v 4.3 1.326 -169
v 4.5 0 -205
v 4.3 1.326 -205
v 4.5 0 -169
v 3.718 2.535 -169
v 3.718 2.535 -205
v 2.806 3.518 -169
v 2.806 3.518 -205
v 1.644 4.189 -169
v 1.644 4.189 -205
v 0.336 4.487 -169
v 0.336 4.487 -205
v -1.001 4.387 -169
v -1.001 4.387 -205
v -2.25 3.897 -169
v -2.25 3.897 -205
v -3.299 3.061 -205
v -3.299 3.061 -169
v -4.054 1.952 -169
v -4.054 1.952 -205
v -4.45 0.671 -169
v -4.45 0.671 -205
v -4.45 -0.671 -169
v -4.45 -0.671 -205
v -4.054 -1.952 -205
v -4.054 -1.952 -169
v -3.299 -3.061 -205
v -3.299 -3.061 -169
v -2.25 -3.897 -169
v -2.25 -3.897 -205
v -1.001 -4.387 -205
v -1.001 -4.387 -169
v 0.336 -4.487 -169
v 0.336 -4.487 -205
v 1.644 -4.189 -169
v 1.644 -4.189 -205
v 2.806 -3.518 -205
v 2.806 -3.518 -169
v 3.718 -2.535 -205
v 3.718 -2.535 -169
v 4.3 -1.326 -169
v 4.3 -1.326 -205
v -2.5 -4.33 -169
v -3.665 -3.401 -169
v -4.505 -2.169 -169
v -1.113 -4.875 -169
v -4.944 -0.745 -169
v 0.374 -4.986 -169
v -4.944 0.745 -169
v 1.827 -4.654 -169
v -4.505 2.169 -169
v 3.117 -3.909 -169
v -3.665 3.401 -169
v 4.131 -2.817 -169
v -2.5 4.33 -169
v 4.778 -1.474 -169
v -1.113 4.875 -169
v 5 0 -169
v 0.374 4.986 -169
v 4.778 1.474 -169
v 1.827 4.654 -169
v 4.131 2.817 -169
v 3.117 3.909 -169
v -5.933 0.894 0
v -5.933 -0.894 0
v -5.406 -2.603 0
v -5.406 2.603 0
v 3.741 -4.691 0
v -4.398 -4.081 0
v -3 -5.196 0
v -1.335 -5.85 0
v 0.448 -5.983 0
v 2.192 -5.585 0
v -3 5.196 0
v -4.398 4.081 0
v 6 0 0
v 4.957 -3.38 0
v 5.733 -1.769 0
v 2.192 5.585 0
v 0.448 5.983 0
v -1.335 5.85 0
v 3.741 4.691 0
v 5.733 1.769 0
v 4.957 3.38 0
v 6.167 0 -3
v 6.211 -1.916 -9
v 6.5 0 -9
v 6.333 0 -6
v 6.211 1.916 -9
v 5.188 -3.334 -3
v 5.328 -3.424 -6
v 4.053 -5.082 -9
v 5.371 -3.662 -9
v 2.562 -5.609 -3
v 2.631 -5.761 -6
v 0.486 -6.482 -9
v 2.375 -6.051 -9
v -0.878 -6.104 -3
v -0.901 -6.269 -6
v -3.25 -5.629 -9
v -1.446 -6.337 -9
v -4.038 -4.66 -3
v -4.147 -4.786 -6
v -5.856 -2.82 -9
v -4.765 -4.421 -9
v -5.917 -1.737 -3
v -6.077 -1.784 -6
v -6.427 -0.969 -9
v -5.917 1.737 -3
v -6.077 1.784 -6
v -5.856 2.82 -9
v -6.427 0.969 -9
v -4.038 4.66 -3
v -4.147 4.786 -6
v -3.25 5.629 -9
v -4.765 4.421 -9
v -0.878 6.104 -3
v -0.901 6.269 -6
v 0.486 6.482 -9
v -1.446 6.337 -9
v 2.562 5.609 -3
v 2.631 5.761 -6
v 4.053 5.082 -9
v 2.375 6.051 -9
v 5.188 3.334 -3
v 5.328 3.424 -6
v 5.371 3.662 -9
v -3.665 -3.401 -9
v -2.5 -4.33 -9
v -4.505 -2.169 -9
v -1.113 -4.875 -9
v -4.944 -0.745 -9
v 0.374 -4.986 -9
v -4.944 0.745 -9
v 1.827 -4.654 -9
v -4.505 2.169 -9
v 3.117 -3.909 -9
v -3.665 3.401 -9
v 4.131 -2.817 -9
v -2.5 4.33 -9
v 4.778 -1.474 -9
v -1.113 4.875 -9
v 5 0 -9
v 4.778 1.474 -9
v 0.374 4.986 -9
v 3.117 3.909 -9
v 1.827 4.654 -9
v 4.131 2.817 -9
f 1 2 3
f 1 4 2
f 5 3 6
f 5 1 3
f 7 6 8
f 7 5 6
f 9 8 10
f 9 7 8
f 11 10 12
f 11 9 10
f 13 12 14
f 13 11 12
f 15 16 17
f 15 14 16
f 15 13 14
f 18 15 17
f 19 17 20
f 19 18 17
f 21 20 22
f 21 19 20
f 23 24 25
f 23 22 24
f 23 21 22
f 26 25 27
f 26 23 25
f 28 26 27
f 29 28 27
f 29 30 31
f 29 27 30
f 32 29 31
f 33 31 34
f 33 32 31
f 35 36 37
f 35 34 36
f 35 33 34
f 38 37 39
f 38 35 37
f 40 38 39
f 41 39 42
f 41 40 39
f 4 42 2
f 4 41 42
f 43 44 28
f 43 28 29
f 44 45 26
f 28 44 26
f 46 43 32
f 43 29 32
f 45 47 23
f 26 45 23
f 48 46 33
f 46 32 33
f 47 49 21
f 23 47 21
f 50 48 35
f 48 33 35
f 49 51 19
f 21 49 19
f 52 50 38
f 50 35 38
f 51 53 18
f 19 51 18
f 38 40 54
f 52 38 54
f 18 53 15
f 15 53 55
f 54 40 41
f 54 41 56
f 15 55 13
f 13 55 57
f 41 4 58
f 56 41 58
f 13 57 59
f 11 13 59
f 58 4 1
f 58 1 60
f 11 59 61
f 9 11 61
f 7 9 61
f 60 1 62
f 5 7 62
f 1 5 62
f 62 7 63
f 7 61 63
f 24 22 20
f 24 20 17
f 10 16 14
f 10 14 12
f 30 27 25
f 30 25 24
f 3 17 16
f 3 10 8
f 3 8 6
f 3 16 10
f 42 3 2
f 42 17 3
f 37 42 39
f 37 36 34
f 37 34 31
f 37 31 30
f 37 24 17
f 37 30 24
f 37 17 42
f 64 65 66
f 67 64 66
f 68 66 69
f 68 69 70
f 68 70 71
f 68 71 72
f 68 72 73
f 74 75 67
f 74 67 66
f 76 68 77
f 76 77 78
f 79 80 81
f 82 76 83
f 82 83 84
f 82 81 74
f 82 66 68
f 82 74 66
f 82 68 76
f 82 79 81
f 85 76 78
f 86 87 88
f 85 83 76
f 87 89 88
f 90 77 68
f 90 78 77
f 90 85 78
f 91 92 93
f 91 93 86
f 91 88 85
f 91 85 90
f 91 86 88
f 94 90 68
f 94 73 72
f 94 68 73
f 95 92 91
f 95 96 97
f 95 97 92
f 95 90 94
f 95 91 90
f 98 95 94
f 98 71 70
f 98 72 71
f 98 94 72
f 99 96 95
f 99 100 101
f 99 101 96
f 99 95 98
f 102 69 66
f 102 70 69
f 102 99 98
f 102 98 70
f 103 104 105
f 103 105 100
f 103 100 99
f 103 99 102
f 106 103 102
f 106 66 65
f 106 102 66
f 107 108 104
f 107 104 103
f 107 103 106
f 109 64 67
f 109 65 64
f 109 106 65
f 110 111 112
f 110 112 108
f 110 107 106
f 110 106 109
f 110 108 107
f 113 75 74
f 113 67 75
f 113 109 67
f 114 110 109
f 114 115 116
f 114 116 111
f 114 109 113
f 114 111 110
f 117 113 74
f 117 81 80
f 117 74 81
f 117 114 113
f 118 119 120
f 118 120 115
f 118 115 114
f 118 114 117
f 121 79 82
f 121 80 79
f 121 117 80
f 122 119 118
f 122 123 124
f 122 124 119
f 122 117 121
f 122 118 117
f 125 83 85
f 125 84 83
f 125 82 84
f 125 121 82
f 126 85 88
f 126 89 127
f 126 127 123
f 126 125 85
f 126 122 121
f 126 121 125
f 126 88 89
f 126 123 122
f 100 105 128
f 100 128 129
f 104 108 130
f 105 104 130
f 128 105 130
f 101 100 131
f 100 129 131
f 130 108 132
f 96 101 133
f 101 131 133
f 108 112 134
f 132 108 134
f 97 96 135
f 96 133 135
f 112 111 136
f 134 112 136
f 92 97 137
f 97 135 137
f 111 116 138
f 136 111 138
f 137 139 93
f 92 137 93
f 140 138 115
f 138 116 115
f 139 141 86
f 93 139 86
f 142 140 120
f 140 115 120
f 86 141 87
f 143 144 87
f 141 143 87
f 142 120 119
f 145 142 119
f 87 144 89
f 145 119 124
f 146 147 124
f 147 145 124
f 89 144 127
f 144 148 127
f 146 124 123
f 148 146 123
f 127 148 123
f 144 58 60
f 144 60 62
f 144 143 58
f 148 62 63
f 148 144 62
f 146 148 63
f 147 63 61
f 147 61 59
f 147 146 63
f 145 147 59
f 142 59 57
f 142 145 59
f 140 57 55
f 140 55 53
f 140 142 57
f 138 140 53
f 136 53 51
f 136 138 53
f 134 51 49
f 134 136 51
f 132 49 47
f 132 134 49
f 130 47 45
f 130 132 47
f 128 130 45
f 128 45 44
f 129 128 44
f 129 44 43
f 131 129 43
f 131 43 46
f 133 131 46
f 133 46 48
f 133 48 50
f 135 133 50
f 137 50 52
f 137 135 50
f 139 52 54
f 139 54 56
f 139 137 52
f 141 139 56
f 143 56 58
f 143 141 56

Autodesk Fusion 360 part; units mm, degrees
sketch "Sketch1" plane through (0, 0, 0) normal (0, 0, 1) x (1, 0, 0)
  circle A0 centre (0, 0) radius 6
  dimension "d1" = 12
ref_plane "WorkPlane1" through (0, 0, -9) normal (0, 0, 1) x (1, 0, 0)
sketch "Sketch3" plane through (0, 0, -9) normal (0, 0, 1) x (1, 0, 0)
  circle A0 centre (0, 0) radius 6.5
  dimension "d8" = 13
sketch "Sketch4" plane through (0, 0, -9) normal (0, 0, 1) x (1, 0, 0)
  circle A0 centre (0, 0) radius 5
  dimension "d9" = 10
loft "Loft1" add profiles "Sketch3", "Sketch1" section 1 section 2
extrude "Extrude3" add sketch "Sketch4" against normal blind 160
sketch "Sketch5" plane through (0, 0, -169) normal (0, 0, -1) x (1, 0, 0)
  circle A0 centre (0, 0) radius 5
  circle A1 centre (0, 0) radius 4.5
  dimension "d12" = 9
extrude "Extrude4" add sketch "Sketch5" along normal blind 36 contours A1
